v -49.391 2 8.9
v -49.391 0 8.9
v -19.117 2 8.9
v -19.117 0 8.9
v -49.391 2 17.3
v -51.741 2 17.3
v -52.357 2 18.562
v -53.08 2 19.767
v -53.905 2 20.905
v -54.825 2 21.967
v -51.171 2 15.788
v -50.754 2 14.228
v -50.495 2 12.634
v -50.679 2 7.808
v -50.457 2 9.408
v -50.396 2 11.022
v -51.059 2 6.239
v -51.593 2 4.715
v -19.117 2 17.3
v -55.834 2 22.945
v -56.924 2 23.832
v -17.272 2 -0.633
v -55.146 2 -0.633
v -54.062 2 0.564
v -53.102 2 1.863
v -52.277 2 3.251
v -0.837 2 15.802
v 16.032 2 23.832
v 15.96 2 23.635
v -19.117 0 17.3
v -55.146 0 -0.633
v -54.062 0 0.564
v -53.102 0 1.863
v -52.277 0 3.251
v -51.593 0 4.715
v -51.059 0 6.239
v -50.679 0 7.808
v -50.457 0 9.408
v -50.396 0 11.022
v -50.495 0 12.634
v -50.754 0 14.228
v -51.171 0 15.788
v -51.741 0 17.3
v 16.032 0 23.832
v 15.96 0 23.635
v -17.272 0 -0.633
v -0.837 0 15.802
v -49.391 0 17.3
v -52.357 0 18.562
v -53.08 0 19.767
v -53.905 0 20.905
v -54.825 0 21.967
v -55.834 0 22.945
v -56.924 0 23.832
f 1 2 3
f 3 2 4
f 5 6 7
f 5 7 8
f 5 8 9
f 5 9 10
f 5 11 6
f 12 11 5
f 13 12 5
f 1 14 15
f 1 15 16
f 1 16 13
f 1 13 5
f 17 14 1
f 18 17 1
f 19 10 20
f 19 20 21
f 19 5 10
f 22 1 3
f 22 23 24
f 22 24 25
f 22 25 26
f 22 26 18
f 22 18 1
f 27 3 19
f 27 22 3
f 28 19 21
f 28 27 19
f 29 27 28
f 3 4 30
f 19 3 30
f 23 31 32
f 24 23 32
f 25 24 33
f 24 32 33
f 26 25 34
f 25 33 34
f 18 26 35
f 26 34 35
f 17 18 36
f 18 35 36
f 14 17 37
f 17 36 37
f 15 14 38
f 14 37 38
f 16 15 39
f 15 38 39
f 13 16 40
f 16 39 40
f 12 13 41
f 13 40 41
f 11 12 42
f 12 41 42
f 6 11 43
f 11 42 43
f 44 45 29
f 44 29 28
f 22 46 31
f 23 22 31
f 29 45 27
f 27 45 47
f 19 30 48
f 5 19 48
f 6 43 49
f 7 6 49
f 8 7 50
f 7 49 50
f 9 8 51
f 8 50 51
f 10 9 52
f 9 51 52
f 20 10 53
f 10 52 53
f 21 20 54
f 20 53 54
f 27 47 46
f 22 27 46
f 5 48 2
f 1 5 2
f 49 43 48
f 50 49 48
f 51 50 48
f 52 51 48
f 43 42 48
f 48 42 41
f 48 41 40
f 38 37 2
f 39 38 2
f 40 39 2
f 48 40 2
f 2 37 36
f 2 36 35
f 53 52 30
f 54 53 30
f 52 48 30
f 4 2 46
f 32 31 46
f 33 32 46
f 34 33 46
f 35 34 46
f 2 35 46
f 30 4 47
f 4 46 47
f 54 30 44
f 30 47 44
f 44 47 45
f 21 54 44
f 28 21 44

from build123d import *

# Parameters (mm, degrees)
EXTRUDE_1_DEPTH          = 2
CUT_EXTRUDE_1_DEPTH      = 106.5
CUT_EXTRUDE_1_DEPTH_BACK = 62.743635726


with BuildPart() as part:
    # Эскиз1 → Бобышка-Вытянуть1 (new body)
    with BuildSketch(Plane(origin=(0, 0, 0), x_dir=(1, 0, 0), z_dir=(0, 1, 0))):
        with BuildLine():
            Line((-56.923759365, -23.831956958), (16.382902061, -23.831956958))
            Line((16.382902061, -23.831956958), (-0.836945892, -15.802209985))
            Line((-0.836945892, -15.802209985), (-17.271974735, 0.632818857))
            Line((-17.271974735, 0.632818857), (-55.146365247, 0.632818857))
            ThreePointArc((-55.146365247, 0.632818857), (-50.679018006, -7.808361393), (-51.74094673, -17.29956905))
            ThreePointArc((-51.74094673, -17.29956905), (-53.905020217, -20.904809923), (-56.923759365, -23.831956958))
        make_face()
        Polygon((-19.117097939, -17.29956905), (-49.391279562, -17.29956905), (-49.391279562, -8.89956905), (-27.396659044, -8.89956905), (-19.117097939, -8.89956905), align=None, mode=Mode.SUBTRACT)
    extrude(amount=EXTRUDE_1_DEPTH)

    # Эскиз2 → Вырез-Вытянуть1 (cut, two sides: drawn at the far end of the back side and taken through both)
    with BuildSketch(Plane(origin=(0, 2, 0), x_dir=(1, 0, 0), z_dir=(0, 1, 0)).offset(-CUT_EXTRUDE_1_DEPTH_BACK)):
        Polygon((16.382902061, -23.831956958), (15.960145161, -23.634822178), (16.059019052, -23.90647596), align=None)
    extrude(amount=CUT_EXTRUDE_1_DEPTH + CUT_EXTRUDE_1_DEPTH_BACK, mode=Mode.SUBTRACT)


solid = part.part
